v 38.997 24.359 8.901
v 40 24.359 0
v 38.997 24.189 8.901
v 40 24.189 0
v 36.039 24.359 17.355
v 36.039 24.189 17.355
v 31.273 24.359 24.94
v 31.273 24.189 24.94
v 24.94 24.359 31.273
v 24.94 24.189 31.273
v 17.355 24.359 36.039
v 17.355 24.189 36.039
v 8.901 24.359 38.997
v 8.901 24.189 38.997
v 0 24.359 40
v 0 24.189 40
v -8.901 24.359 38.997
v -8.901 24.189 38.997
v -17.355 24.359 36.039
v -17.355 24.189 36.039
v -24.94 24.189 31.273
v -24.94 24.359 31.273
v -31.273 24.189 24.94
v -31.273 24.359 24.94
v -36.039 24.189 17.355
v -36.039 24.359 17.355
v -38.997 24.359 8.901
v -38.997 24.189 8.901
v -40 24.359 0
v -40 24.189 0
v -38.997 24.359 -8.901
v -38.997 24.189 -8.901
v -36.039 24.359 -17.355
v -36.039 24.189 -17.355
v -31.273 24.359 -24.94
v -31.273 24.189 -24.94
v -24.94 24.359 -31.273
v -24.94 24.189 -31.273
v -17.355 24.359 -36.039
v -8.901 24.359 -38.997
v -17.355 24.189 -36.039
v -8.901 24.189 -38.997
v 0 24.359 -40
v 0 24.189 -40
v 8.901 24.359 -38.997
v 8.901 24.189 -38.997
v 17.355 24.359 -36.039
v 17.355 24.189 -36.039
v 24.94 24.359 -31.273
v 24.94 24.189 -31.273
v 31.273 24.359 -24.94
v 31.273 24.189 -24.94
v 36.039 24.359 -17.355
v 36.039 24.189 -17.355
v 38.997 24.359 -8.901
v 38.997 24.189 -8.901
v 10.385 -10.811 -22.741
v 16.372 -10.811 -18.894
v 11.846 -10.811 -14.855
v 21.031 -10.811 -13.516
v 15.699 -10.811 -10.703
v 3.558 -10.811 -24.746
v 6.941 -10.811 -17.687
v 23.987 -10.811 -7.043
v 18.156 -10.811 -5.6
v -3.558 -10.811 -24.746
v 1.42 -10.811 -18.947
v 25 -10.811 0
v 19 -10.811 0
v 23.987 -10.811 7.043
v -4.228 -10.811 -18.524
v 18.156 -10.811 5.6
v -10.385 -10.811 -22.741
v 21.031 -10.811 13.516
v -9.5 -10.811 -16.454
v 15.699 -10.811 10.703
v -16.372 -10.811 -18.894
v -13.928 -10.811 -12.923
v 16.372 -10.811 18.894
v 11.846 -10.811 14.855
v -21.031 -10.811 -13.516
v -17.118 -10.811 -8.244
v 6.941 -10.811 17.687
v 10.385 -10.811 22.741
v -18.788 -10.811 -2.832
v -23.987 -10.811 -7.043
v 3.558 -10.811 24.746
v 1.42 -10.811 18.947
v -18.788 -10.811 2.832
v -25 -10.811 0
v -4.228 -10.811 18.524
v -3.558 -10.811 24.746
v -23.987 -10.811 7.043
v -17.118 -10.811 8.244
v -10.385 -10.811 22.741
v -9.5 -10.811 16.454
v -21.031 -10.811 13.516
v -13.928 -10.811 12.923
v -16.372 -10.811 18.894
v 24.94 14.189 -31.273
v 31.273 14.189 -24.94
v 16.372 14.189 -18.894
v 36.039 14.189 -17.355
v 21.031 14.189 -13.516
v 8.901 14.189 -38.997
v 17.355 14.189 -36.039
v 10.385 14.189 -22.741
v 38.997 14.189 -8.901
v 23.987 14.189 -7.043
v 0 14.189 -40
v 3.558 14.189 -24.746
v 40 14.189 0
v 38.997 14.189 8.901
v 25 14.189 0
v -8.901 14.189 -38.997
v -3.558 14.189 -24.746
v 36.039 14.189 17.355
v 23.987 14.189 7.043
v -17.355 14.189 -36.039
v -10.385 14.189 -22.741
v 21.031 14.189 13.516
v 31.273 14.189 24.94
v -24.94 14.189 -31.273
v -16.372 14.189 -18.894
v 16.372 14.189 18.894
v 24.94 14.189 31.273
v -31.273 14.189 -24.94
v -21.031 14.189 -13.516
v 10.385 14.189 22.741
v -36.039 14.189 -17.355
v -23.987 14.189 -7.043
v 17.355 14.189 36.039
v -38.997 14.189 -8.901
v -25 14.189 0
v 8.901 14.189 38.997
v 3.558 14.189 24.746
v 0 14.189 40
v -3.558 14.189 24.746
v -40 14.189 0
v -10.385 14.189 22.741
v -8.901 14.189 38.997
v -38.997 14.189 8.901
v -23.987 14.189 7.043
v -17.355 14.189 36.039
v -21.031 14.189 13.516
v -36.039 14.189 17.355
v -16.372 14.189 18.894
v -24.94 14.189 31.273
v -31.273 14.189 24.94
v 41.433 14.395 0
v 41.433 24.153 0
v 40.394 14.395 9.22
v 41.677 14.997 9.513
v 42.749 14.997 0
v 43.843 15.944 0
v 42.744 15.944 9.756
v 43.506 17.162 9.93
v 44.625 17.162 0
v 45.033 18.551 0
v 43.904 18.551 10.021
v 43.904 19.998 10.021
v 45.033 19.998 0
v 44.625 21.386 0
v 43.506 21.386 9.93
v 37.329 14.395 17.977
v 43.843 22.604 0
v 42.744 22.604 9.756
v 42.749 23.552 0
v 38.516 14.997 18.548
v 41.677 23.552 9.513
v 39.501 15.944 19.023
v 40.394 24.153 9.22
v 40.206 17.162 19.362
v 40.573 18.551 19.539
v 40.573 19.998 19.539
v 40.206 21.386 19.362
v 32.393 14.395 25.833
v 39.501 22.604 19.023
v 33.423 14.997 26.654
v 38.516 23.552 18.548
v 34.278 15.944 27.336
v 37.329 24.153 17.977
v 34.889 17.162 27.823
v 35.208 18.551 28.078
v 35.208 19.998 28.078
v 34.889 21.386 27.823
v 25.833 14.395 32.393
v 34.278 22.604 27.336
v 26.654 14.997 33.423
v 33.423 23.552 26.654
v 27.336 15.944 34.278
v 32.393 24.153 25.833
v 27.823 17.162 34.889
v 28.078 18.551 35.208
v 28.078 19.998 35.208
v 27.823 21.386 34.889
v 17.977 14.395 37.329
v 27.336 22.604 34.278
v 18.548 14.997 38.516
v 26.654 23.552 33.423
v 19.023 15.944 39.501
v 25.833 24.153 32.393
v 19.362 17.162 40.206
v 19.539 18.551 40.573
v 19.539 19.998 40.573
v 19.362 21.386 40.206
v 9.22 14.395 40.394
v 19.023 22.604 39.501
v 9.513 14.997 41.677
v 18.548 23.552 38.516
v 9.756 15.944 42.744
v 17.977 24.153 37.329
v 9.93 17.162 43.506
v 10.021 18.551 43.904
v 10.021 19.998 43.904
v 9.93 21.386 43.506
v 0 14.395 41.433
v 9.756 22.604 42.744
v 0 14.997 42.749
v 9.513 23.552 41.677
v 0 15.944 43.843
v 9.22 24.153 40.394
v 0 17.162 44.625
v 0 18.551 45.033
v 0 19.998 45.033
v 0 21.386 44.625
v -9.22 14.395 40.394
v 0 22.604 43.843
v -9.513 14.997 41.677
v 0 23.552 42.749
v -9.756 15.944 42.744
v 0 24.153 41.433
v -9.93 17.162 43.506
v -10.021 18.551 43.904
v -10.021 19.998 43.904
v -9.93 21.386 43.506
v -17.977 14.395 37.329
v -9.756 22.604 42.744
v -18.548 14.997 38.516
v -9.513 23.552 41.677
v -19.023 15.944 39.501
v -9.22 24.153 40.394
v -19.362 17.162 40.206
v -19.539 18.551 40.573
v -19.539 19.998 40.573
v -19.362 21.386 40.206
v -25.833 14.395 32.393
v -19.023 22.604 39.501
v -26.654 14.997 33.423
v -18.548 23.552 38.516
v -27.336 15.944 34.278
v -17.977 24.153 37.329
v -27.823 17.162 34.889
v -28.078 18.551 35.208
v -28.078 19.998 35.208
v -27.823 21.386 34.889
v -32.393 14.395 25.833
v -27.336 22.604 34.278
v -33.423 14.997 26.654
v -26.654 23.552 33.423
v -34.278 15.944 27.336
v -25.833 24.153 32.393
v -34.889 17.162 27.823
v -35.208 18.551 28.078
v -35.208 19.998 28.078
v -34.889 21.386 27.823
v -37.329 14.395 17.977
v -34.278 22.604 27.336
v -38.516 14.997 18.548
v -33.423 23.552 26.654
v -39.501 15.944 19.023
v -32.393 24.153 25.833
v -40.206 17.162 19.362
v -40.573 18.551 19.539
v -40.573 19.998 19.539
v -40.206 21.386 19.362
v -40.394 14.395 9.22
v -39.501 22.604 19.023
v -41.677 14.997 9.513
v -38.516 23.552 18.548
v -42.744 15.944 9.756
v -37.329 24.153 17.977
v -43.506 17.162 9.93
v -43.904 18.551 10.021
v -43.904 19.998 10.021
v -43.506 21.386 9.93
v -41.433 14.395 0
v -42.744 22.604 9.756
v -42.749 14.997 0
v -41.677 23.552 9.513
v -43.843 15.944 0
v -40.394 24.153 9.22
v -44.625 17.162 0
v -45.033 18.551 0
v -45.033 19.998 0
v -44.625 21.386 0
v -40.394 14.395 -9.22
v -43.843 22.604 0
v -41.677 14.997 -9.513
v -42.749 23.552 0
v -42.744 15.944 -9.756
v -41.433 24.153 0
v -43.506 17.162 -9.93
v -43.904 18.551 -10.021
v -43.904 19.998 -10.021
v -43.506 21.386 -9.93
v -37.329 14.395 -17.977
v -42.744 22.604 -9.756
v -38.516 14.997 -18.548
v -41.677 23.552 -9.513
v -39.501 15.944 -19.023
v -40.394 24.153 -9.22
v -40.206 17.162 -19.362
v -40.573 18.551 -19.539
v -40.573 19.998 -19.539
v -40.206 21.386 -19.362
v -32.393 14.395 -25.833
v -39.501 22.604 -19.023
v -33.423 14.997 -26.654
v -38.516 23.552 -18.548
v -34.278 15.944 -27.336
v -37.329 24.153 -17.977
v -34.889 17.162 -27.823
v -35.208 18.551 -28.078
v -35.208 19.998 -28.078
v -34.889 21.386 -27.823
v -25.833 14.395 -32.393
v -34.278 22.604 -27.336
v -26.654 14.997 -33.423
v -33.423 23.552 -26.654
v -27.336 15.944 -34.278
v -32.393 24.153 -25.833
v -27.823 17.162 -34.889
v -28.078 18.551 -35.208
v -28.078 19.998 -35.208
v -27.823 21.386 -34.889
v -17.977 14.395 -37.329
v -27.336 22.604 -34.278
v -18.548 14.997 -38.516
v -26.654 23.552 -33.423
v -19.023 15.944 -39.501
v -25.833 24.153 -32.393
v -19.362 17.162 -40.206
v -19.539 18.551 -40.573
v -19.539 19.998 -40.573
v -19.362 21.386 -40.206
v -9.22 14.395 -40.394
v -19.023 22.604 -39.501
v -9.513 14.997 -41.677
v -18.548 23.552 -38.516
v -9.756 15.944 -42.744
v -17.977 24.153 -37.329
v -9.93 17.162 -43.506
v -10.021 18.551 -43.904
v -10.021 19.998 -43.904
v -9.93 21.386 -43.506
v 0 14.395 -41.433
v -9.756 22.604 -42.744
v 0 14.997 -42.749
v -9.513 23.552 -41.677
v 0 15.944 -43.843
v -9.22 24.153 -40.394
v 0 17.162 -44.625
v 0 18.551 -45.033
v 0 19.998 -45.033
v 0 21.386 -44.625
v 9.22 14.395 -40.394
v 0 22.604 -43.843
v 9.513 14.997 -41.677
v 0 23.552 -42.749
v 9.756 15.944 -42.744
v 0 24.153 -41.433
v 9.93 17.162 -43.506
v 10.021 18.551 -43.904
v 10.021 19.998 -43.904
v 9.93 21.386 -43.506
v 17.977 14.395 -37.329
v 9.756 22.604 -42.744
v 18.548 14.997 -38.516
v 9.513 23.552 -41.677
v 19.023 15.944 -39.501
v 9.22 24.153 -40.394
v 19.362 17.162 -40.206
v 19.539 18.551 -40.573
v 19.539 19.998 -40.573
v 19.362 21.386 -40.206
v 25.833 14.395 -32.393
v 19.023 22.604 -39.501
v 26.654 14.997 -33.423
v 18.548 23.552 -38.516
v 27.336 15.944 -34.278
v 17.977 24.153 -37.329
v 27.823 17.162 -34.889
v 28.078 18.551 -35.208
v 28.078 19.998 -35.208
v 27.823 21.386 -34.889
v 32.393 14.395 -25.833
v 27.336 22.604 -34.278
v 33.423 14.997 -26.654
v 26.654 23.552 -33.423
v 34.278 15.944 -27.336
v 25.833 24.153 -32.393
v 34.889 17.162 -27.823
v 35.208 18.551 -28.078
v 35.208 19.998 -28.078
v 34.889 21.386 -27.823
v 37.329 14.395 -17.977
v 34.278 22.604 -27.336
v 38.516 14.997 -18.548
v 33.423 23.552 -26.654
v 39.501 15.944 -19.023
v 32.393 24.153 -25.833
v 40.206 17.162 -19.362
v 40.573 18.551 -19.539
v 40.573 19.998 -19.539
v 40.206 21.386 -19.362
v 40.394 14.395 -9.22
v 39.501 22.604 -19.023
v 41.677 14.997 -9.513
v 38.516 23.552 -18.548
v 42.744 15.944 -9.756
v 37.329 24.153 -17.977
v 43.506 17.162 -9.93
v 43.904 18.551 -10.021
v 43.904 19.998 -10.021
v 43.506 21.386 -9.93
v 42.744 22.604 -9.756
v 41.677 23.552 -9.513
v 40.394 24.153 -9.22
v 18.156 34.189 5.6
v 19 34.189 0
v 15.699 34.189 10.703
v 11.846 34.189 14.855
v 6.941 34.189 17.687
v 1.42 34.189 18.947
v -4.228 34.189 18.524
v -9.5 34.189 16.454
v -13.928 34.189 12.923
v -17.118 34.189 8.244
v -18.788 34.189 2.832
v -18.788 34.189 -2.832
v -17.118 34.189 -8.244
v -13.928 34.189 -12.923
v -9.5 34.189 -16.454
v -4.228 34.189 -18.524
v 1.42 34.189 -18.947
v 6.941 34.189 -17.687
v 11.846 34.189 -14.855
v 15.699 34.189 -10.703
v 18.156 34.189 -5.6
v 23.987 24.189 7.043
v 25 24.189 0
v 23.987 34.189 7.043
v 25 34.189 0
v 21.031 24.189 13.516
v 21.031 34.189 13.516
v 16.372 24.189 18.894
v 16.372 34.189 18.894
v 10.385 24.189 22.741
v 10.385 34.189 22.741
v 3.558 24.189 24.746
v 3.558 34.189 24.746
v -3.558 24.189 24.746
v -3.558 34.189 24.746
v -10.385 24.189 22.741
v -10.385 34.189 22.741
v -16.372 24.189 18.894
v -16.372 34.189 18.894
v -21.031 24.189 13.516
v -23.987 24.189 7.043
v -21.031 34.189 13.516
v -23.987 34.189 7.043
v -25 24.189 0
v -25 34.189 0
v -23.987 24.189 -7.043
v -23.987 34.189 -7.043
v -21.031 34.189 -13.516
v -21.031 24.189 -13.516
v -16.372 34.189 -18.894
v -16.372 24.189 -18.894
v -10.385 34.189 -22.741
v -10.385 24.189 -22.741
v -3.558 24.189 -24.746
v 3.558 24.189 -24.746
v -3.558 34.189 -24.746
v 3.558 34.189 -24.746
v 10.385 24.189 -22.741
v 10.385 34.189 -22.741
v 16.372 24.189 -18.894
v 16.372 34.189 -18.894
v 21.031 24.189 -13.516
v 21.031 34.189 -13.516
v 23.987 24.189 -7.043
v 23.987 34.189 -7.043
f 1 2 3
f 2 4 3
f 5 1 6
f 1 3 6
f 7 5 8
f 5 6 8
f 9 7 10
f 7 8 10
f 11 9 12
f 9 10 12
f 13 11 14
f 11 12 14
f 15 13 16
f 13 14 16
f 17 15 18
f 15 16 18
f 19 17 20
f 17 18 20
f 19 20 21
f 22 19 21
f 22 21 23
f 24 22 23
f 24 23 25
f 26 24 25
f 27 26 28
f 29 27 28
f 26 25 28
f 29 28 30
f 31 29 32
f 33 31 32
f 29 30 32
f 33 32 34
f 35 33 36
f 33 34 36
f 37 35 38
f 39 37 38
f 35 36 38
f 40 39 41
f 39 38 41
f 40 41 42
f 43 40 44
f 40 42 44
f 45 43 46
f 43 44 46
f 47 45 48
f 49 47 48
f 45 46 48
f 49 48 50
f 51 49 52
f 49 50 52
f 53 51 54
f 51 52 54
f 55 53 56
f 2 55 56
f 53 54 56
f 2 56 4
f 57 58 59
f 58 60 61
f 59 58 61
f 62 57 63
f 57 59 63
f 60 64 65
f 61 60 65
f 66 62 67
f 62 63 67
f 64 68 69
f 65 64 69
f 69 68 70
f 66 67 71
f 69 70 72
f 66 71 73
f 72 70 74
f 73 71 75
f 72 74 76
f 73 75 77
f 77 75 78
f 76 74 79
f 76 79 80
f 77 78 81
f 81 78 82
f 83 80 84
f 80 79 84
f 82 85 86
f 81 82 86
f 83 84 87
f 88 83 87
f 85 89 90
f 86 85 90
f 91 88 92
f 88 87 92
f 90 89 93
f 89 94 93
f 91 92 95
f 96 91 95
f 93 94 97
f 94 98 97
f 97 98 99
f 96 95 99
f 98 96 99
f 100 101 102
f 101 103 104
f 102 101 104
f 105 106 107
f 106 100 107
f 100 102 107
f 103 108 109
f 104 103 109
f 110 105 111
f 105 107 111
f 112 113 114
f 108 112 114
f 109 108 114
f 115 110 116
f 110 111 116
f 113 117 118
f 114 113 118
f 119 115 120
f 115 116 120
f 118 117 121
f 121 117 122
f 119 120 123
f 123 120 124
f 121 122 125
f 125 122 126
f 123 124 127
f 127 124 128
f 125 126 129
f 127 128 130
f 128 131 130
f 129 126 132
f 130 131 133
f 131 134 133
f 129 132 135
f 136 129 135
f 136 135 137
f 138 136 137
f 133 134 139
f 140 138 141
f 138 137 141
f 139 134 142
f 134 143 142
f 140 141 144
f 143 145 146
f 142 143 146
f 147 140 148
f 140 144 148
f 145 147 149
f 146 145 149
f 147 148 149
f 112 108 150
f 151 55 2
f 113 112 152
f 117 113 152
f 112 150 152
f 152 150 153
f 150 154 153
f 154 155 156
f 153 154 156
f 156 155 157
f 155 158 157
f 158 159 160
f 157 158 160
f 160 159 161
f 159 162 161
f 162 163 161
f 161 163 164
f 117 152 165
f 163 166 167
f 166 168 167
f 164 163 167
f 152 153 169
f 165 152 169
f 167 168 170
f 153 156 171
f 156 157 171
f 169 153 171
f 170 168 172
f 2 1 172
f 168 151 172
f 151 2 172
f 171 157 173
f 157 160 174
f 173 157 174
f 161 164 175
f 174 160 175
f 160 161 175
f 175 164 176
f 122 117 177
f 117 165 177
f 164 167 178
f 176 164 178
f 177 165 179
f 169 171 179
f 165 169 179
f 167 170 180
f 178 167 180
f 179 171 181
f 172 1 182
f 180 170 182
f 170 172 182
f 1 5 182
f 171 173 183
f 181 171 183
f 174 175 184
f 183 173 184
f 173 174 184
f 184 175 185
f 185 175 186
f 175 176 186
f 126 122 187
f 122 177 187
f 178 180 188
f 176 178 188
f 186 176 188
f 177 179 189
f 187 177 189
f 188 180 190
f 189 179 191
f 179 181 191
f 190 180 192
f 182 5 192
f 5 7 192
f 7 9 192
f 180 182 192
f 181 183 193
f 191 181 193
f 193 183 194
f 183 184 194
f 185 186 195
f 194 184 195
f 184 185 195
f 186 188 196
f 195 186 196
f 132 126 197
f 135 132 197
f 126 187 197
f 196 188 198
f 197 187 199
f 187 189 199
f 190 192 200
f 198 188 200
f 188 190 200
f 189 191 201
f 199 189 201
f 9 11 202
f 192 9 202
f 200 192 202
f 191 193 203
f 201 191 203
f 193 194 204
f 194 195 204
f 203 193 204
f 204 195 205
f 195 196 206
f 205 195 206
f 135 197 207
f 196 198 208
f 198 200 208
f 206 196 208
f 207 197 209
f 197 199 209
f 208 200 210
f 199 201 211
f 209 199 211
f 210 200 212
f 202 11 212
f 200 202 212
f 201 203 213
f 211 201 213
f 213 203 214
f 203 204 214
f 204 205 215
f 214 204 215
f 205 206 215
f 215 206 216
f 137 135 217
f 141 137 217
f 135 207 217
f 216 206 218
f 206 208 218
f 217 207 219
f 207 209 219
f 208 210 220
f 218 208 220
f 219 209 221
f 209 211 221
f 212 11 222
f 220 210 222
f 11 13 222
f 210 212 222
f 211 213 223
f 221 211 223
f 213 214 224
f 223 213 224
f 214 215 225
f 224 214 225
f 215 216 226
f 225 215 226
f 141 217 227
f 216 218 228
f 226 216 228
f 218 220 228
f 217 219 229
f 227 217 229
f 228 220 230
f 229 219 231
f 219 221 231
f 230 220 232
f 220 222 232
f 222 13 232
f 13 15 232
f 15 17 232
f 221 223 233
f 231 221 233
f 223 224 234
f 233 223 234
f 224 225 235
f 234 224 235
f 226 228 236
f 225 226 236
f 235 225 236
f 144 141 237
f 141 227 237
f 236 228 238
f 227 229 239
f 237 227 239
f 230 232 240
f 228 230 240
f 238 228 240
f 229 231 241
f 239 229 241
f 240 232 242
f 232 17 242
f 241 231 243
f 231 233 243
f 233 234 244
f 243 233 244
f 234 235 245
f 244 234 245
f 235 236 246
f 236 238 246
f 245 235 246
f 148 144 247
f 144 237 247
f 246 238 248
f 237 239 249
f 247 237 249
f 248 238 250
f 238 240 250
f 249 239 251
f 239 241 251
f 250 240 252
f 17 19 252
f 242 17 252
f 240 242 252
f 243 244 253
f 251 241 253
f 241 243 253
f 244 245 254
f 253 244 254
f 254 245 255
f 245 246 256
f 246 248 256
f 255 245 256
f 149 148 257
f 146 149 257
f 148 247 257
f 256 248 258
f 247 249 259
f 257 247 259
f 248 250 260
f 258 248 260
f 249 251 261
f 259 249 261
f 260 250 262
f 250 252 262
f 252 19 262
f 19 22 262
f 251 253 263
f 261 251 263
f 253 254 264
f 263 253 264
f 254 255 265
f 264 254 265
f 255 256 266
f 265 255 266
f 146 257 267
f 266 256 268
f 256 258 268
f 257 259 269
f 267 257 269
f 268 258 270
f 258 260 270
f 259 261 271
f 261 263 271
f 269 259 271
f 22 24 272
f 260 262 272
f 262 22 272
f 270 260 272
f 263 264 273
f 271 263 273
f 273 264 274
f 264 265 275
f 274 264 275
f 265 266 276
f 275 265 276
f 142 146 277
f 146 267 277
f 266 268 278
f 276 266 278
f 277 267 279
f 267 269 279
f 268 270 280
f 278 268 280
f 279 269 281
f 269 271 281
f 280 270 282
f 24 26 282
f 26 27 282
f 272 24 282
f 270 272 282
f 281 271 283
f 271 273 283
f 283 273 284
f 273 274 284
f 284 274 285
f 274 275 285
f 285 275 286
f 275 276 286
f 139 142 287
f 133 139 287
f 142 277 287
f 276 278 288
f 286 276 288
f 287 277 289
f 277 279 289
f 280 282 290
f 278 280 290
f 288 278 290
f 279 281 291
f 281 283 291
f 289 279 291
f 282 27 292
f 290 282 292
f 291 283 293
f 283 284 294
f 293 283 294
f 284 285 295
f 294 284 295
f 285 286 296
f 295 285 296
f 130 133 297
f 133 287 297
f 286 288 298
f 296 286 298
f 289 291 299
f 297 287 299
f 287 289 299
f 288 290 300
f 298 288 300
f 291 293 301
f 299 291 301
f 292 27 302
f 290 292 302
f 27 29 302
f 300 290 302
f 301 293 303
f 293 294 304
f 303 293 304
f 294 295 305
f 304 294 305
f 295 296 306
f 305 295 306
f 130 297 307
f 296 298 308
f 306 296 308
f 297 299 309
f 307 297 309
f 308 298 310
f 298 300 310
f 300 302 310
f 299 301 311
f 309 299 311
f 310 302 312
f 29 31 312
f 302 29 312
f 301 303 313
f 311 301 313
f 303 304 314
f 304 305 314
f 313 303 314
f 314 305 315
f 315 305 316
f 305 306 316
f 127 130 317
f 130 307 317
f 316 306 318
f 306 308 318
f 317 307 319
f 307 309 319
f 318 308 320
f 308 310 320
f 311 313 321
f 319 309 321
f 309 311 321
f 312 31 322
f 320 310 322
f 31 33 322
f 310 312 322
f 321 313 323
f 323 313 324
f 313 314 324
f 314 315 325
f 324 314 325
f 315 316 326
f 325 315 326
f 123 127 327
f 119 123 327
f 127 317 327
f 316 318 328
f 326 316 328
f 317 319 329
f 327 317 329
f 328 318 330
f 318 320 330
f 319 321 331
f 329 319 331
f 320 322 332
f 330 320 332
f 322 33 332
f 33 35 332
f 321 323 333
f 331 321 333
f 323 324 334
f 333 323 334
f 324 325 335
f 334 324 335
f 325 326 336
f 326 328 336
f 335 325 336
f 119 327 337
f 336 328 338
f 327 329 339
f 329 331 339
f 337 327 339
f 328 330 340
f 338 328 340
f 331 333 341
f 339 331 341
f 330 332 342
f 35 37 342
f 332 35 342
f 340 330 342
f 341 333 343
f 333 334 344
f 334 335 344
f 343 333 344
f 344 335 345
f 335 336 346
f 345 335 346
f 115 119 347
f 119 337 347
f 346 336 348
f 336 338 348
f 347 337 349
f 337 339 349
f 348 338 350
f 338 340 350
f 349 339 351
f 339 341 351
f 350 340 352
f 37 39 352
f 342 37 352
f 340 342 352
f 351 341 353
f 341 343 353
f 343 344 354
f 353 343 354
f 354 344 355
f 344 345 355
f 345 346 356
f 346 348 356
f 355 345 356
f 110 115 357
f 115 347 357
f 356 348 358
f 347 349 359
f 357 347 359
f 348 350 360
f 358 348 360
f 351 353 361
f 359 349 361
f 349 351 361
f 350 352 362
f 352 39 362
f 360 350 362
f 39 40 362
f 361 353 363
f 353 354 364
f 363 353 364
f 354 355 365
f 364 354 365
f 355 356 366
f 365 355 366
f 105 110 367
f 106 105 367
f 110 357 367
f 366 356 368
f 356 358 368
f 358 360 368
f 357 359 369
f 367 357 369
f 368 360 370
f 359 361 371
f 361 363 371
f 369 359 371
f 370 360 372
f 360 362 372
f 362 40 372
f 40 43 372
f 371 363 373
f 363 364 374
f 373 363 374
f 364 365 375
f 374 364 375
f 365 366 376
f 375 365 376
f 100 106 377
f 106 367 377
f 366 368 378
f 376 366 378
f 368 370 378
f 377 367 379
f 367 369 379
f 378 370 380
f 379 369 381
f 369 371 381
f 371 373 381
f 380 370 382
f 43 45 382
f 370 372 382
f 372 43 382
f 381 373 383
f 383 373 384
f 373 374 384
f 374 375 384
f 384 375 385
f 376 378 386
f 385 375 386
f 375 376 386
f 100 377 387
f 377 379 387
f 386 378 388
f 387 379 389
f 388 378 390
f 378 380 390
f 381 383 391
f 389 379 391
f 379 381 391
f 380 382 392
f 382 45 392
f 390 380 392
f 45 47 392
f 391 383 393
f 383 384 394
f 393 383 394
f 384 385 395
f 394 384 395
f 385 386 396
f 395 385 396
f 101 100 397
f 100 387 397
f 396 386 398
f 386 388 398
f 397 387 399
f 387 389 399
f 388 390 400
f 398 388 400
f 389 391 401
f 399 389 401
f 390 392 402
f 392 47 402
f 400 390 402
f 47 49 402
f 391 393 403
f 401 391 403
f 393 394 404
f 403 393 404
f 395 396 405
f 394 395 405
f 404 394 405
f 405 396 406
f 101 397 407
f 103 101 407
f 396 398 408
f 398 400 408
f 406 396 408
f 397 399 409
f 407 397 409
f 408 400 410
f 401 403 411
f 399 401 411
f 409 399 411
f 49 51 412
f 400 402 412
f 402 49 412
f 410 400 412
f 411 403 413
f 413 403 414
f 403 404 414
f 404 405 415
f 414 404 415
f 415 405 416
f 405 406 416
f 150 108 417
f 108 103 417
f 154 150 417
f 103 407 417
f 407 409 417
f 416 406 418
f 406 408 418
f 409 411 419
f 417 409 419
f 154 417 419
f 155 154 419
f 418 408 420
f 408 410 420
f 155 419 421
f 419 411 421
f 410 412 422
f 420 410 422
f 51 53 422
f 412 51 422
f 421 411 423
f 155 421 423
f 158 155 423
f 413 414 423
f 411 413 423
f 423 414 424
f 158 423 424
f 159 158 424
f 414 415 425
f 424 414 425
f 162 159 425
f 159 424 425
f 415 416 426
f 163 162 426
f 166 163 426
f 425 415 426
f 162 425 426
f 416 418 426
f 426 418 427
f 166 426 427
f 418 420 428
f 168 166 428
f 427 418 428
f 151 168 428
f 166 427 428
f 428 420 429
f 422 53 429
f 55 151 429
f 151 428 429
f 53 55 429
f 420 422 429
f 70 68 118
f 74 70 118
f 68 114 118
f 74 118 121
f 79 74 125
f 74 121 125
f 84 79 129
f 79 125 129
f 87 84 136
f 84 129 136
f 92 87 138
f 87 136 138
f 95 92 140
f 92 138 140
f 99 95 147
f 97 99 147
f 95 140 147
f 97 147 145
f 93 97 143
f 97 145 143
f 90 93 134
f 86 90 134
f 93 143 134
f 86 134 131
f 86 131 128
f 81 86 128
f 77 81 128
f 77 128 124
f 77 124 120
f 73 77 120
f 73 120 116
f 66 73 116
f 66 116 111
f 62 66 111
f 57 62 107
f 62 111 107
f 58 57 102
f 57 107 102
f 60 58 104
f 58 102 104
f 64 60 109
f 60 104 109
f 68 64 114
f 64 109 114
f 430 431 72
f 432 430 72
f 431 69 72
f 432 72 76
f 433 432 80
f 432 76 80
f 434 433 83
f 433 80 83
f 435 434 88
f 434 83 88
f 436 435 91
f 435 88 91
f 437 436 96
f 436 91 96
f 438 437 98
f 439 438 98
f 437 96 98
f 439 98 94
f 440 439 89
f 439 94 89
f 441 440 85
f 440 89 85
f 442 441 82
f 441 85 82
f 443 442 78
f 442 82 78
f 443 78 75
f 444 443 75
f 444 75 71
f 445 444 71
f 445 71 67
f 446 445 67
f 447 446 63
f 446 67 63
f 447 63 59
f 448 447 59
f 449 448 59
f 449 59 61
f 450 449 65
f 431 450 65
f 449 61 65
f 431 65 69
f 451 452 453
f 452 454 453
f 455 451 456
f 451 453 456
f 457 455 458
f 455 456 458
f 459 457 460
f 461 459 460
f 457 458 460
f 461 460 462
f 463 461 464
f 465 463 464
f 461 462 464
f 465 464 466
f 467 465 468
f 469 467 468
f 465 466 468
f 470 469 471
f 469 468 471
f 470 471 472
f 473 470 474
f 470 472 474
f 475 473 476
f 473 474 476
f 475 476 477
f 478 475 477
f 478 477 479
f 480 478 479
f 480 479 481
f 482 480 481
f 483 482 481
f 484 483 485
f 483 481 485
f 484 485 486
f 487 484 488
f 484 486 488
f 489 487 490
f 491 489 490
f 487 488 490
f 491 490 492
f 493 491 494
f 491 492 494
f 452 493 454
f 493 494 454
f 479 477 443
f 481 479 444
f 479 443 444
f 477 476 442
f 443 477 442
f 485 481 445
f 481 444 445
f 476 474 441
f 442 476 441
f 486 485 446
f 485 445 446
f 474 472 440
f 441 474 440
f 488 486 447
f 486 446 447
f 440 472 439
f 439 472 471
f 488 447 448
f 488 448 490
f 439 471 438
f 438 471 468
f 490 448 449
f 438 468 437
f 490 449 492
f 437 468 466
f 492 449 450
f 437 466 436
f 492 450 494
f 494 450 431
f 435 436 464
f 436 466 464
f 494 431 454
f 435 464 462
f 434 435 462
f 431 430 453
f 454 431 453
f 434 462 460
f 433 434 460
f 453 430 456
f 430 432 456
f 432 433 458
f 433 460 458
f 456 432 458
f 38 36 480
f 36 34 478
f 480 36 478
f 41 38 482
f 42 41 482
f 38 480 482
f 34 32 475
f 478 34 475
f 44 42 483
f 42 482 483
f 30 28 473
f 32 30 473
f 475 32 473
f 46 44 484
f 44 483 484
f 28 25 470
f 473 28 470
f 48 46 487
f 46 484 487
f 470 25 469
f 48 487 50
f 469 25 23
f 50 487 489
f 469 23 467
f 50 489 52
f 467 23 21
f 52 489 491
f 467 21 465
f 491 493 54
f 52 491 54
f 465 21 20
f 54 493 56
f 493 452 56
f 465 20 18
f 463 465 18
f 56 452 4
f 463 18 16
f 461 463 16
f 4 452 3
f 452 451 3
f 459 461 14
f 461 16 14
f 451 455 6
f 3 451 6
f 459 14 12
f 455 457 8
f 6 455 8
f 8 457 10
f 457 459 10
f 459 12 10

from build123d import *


with BuildPart() as part:
    # Sketch1 → Revolve1 (revolve)
    with BuildSketch(Plane.XY):
        with BuildLine():
            Line((19, 34.18946336), (19, -10.81053664))
            Line((19, -10.81053664), (25, -10.81053664))
            Line((25, -10.81053664), (25, 14.18946336))
            Line((25, 14.18946336), (40, 14.18946336))
            ThreePointArc((40, 14.18946336), (45.084745763, 19.274209123), (40, 24.358954886))
            Line((40, 24.358954886), (40, 24.18946336))
            Line((40, 24.18946336), (25, 24.18946336))
            Line((25, 24.18946336), (25, 34.18946336))
            Line((25, 34.18946336), (19, 34.18946336))
        make_face()
    revolve(axis=Axis((0, 56.797792619, 0), (0, -1, 0)))


solid = part.part
